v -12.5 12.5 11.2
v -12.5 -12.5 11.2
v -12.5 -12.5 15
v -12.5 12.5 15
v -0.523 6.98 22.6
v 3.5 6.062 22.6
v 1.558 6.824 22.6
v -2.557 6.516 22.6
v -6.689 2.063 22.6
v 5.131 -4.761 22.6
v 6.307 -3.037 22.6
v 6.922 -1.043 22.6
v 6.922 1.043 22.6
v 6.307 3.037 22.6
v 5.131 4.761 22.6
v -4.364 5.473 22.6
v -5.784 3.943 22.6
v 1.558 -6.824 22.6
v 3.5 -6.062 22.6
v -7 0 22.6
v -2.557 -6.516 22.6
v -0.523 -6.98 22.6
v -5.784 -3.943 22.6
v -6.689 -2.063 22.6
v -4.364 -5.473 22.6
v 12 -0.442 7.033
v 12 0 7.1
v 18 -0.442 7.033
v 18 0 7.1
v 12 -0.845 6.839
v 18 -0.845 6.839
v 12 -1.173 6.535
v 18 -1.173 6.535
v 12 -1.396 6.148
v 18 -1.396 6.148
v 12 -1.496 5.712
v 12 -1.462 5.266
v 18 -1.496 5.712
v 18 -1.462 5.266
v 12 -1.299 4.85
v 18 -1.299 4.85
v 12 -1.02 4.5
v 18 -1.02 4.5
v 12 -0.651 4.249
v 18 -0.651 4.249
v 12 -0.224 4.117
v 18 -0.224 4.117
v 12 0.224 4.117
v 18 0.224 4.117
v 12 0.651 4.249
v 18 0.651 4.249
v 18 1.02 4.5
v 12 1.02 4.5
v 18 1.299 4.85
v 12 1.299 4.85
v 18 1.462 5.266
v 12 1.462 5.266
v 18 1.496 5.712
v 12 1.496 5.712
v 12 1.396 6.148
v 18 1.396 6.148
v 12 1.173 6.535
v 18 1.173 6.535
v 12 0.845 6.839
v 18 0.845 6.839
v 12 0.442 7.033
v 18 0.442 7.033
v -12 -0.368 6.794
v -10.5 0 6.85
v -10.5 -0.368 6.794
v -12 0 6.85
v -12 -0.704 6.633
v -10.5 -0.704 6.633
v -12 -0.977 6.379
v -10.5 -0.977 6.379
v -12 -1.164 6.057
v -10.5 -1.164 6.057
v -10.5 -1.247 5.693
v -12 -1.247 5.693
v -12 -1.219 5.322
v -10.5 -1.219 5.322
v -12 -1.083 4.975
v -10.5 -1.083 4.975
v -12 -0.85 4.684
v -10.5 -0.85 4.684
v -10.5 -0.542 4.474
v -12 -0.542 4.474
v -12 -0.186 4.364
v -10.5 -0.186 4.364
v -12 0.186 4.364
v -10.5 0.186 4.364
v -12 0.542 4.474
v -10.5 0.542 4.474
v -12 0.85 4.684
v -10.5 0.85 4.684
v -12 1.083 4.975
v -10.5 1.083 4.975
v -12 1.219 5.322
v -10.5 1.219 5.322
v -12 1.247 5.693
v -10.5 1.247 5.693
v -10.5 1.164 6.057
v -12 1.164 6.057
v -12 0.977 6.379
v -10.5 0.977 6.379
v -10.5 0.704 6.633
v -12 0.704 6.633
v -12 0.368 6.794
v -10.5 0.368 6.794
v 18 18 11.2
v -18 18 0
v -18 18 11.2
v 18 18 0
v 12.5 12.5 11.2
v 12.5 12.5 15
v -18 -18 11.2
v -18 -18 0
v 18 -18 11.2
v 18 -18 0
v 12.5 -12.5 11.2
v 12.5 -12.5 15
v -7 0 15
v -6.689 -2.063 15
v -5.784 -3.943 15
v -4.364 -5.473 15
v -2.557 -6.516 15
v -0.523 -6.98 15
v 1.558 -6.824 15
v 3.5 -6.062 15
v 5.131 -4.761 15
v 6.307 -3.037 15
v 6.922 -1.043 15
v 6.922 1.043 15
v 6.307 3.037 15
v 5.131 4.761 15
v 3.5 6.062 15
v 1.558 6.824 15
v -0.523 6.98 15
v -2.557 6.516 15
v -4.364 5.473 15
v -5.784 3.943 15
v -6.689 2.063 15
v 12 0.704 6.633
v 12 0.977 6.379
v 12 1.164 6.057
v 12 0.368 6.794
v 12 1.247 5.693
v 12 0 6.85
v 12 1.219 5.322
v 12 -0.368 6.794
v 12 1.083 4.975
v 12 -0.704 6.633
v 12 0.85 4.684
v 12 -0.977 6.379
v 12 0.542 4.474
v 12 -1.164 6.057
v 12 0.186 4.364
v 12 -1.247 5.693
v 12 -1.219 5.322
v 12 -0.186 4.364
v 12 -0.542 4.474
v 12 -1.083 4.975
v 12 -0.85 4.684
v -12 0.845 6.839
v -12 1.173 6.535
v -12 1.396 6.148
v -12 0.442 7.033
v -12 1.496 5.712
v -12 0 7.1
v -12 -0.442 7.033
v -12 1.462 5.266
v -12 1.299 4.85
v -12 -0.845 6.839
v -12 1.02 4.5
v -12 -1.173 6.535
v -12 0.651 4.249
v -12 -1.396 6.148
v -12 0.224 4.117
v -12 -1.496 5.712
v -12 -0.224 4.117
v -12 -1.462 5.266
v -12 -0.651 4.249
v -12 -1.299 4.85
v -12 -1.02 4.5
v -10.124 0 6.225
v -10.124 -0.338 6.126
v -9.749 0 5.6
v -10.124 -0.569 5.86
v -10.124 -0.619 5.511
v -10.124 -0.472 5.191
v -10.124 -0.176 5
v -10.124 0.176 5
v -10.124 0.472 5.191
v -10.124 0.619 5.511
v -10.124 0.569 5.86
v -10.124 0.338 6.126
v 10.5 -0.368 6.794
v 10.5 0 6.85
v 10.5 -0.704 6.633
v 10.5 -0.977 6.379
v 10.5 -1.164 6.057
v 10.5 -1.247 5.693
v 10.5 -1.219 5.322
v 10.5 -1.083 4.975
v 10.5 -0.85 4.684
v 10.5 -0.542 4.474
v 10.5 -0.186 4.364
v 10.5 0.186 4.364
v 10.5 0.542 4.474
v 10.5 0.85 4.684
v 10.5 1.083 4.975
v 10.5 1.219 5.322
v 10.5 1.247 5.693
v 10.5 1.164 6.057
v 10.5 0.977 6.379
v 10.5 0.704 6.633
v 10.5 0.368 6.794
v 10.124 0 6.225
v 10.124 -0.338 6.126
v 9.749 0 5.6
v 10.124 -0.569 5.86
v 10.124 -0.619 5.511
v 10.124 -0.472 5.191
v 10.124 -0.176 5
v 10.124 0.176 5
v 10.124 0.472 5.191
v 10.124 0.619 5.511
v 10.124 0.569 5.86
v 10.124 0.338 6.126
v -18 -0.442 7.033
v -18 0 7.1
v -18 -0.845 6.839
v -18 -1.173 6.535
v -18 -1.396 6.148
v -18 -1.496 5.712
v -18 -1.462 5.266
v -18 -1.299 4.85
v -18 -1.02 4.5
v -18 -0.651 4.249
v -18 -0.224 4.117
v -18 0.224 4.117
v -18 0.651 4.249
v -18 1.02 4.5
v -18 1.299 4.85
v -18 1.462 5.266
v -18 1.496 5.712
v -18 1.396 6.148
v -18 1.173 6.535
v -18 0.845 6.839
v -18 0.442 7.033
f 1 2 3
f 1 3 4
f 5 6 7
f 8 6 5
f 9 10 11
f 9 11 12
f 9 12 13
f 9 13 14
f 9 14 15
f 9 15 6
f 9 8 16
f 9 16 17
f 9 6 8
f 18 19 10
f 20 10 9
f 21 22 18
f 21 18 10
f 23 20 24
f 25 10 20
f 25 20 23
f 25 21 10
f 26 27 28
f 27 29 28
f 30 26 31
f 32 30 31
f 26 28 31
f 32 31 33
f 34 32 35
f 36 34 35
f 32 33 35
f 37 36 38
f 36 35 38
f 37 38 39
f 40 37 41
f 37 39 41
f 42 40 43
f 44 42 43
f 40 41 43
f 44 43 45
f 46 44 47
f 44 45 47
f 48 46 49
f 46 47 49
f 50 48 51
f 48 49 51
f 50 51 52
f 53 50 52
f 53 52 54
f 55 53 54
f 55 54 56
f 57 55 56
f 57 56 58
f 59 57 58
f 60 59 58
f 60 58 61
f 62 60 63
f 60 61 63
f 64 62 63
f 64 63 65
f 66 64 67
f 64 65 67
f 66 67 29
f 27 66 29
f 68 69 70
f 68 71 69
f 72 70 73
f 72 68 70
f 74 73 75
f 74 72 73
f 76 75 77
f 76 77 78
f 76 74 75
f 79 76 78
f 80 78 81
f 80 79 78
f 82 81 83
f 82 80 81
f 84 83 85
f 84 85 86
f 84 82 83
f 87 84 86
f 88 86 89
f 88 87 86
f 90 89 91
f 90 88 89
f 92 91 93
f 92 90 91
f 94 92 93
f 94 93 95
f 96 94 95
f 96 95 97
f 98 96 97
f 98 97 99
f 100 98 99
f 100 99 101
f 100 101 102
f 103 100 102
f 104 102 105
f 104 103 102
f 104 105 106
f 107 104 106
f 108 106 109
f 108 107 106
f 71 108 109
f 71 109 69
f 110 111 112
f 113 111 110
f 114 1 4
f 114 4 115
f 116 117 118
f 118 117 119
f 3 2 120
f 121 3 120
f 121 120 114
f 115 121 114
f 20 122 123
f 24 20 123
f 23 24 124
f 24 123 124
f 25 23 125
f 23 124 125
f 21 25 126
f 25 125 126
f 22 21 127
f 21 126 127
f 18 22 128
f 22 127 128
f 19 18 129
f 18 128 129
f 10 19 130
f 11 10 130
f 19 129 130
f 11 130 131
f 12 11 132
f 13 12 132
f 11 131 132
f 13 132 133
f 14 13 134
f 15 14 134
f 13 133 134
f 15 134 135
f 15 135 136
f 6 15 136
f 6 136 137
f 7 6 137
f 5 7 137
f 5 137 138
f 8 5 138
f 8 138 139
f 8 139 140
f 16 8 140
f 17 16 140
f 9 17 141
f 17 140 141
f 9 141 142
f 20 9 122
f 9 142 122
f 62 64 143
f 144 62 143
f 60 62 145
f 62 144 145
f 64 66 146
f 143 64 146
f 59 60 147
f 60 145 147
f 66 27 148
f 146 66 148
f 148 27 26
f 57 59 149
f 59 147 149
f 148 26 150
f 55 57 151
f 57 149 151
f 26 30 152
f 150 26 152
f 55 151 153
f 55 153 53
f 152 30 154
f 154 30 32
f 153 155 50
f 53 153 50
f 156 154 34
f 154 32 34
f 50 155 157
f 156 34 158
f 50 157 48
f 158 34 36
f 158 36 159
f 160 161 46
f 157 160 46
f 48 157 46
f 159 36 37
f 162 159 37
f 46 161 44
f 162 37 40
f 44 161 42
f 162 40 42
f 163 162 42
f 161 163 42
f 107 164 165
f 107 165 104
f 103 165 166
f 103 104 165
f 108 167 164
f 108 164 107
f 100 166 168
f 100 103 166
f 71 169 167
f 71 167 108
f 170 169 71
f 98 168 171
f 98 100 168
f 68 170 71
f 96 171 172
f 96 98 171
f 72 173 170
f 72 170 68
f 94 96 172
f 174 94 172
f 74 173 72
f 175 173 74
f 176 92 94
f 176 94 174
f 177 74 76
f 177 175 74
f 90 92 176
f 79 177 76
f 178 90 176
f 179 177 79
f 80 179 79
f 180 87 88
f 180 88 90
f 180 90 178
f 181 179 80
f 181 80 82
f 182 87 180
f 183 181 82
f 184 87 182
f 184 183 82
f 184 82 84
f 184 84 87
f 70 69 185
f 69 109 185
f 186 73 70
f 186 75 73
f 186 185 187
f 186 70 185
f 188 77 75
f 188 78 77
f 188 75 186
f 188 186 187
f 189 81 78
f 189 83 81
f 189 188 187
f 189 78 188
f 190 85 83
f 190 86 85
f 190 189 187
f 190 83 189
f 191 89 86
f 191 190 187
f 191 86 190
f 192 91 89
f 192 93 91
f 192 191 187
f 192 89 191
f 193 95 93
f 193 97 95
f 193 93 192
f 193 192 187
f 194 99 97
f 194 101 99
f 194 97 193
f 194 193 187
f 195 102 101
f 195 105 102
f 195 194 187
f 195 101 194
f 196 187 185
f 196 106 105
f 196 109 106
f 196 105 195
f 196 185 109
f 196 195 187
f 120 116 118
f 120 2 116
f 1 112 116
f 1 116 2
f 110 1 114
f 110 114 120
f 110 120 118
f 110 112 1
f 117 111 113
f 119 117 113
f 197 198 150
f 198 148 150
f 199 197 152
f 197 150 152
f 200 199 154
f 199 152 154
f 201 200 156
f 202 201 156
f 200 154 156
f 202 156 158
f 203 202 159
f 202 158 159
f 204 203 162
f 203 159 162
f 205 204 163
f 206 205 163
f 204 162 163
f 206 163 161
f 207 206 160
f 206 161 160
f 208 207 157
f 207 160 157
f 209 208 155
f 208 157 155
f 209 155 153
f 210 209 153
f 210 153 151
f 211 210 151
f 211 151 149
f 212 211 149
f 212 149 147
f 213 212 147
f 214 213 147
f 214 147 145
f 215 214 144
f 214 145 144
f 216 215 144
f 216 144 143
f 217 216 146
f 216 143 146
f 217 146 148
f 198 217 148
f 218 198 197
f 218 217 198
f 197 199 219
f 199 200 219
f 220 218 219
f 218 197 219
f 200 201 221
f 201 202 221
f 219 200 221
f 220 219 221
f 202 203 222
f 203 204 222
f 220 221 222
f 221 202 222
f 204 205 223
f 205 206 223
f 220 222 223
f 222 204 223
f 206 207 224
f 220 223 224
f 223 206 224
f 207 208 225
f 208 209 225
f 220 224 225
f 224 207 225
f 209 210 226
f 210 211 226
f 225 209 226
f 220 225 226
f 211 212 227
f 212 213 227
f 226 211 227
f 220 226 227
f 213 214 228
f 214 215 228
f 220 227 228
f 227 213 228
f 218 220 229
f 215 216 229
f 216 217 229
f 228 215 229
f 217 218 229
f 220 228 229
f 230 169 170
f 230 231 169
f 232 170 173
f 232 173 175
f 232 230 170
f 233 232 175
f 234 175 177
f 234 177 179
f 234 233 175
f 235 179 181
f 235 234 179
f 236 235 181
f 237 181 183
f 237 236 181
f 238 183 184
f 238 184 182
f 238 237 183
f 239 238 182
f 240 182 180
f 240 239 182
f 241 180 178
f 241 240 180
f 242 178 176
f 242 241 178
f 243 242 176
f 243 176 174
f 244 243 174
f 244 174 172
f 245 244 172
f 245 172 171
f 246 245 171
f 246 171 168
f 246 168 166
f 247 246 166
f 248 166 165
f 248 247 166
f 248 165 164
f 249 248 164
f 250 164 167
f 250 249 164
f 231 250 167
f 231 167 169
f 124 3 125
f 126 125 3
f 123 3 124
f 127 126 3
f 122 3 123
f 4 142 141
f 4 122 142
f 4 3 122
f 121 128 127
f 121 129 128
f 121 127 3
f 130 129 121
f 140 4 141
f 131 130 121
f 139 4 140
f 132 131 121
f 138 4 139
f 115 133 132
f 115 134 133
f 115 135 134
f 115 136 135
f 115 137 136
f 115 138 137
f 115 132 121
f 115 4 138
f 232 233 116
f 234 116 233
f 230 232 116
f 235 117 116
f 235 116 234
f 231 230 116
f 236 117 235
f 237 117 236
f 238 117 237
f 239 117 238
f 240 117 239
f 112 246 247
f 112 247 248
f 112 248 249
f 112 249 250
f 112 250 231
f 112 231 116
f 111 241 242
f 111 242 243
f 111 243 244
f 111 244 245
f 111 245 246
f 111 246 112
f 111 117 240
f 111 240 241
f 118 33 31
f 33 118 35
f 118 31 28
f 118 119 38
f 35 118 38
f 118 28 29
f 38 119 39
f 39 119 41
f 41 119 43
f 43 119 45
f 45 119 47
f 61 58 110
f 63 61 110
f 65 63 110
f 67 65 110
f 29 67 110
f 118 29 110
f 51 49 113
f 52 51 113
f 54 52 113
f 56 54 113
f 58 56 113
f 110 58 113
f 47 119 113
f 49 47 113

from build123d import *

# Parameters (mm, degrees)
SKETCH_2_W      = 36
SKETCH_2_H      = 36
EXTRUDE_1_DEPTH = 11.2
SKETCH_3_W      = 25
SKETCH_3_H      = 25
EXTRUDE_2_DEPTH = 3.8
SKETCH_4_R      = 7
EXTRUDE_3_DEPTH = 7.6


with BuildPart() as part:
    # 草图2 → 凸台-拉伸1 (new body)
    with BuildSketch(Plane.XY):
        Rectangle(SKETCH_2_W, SKETCH_2_H)
    extrude(amount=EXTRUDE_1_DEPTH)

    # 草图3 → 凸台-拉伸2 (add)
    with BuildSketch(Plane.XY.offset(11.2)):
        Rectangle(SKETCH_3_W, SKETCH_3_H)
    extrude(amount=EXTRUDE_2_DEPTH)

    # 草图4 → 凸台-拉伸3 (add)
    with BuildSketch(Plane.XY.offset(15)):
        with Locations(Location((0, 0, 0), (0, 0, 180))):
            Circle(SKETCH_4_R)
    extrude(amount=EXTRUDE_3_DEPTH)

    # 草图6 → M3 螺纹孔1 (revolve, cut)
    with BuildSketch(Plane(origin=(-18, 0, 5.6), x_dir=(0, 0, 1), z_dir=(0, 1, 0))):
        Polygon((0, 0), (0, 8.251075774), (1.25, 7.5), (1.25, 6), (1.5, 6), (1.5, 0), align=None)
    hole_wizard_m3_1 = revolve(axis=Axis((-24.35, 0, 5.6), (1, 0, 0)), mode=Mode.SUBTRACT)

    # 镜向1: M3 螺纹孔1 across plane
    add(hole_wizard_m3_1.mirror(Plane(origin=(0, 0, 0), x_dir=(0, 0, 1), z_dir=(1, 0, 0))), mode=Mode.SUBTRACT)


solid = part.part
